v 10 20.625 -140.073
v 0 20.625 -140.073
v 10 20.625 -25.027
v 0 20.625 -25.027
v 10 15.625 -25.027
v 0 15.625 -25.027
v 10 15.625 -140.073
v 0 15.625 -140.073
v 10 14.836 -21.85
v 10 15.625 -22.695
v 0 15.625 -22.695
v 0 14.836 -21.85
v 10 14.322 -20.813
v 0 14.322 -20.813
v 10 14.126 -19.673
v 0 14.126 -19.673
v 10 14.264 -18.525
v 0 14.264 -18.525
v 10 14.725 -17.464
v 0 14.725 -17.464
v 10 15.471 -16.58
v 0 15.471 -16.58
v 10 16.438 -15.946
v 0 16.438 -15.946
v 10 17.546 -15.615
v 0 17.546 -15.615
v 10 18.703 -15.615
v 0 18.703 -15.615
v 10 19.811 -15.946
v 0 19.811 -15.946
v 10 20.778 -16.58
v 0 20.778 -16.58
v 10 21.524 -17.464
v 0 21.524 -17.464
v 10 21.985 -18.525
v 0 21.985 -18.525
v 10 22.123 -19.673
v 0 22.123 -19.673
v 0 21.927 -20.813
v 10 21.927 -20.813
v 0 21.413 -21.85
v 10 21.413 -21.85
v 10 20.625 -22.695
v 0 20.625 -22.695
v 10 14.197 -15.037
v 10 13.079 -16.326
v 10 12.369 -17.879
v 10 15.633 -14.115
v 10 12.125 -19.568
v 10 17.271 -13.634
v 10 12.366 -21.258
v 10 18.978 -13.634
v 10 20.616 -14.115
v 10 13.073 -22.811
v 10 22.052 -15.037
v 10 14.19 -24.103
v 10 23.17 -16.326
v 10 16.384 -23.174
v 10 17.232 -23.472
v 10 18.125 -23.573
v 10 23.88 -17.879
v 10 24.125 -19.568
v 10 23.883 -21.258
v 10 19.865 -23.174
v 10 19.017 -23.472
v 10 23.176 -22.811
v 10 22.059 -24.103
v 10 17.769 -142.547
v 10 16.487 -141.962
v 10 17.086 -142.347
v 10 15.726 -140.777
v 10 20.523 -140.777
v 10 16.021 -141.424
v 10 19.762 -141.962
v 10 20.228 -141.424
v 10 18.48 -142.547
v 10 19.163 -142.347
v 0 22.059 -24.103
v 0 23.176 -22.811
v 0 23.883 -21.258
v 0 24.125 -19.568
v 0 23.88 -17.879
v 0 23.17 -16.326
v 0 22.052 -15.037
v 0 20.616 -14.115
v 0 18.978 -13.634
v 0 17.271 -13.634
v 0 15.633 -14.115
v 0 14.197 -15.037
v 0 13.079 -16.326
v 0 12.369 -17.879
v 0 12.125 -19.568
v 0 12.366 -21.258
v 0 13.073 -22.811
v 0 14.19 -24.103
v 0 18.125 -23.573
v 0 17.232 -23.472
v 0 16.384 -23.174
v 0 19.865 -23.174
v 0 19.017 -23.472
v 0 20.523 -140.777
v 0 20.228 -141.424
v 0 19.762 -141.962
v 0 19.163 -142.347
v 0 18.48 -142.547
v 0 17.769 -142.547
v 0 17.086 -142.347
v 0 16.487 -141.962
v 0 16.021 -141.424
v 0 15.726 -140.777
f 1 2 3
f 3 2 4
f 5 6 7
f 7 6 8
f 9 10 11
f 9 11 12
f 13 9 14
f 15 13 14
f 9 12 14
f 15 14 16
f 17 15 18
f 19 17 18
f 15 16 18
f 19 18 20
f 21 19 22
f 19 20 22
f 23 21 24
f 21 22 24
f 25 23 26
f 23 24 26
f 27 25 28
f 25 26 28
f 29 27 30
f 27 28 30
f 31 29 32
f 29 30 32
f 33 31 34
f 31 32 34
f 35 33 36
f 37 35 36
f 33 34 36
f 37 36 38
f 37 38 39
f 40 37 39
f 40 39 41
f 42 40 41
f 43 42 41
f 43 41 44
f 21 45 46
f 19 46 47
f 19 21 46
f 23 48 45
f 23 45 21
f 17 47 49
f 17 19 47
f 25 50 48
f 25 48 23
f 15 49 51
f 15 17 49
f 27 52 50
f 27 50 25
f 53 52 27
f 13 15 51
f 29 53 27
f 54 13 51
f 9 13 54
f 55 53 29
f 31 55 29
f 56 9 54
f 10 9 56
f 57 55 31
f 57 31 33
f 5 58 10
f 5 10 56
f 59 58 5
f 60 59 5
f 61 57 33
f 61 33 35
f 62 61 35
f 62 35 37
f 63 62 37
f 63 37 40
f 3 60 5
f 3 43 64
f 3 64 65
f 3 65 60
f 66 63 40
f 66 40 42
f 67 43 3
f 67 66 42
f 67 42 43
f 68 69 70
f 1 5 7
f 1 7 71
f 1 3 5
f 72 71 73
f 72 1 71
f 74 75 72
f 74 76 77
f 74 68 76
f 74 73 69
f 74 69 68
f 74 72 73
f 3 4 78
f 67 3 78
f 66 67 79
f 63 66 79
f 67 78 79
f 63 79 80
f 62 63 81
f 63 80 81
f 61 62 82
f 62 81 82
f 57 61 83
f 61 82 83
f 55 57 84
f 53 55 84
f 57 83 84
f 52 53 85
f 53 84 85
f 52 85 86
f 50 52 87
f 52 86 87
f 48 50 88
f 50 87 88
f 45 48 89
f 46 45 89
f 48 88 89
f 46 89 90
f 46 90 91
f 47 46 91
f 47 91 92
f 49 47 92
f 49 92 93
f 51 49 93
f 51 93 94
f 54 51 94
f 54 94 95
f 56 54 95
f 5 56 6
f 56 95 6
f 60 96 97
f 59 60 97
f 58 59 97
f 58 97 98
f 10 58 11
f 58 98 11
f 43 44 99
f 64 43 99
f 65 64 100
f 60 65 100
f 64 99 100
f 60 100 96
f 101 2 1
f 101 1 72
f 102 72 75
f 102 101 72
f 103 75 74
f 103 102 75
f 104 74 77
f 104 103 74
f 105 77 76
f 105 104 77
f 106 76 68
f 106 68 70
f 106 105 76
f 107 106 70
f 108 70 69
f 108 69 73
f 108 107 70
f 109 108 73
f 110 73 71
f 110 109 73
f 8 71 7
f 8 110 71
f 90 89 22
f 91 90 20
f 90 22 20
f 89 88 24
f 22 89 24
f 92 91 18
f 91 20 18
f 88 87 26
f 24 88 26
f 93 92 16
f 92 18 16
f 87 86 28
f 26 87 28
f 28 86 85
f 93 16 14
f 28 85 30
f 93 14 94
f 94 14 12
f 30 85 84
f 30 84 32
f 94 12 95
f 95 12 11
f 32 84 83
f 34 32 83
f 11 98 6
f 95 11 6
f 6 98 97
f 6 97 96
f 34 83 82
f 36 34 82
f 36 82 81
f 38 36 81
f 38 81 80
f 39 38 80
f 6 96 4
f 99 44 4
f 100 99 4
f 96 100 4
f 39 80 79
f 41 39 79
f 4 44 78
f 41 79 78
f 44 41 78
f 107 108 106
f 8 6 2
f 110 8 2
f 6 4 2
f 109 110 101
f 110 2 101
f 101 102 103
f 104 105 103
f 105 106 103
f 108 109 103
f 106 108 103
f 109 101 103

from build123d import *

# Parameters (mm, degrees)
SKETCH1_R           = 4
BOSS_EXTRUDE1_DEPTH = 10


with BuildPart() as part:
    # Sketch1 → Boss-Extrude1 (new body)
    with BuildSketch(Plane(origin=(0, 0, 0), x_dir=(0, 0, -1), z_dir=(1, 0, 0))):
        with BuildLine():
            ThreePointArc((25.027203864, 20.624541707), (13.572847807, 18.124541707), (25.027203864, 15.624541707))
            Line((25.027203864, 15.624541707), (140.072847807, 15.624541707))
            ThreePointArc((140.072847807, 15.624541707), (142.572847807, 18.124541707), (140.072847807, 20.624541707))
            Line((140.072847807, 20.624541707), (25.027203864, 20.624541707))
        make_face()
        with Locations((19.572847807, 18.124541707)):
            Circle(SKETCH1_R, mode=Mode.SUBTRACT)
    extrude(amount=BOSS_EXTRUDE1_DEPTH)


solid = part.part
